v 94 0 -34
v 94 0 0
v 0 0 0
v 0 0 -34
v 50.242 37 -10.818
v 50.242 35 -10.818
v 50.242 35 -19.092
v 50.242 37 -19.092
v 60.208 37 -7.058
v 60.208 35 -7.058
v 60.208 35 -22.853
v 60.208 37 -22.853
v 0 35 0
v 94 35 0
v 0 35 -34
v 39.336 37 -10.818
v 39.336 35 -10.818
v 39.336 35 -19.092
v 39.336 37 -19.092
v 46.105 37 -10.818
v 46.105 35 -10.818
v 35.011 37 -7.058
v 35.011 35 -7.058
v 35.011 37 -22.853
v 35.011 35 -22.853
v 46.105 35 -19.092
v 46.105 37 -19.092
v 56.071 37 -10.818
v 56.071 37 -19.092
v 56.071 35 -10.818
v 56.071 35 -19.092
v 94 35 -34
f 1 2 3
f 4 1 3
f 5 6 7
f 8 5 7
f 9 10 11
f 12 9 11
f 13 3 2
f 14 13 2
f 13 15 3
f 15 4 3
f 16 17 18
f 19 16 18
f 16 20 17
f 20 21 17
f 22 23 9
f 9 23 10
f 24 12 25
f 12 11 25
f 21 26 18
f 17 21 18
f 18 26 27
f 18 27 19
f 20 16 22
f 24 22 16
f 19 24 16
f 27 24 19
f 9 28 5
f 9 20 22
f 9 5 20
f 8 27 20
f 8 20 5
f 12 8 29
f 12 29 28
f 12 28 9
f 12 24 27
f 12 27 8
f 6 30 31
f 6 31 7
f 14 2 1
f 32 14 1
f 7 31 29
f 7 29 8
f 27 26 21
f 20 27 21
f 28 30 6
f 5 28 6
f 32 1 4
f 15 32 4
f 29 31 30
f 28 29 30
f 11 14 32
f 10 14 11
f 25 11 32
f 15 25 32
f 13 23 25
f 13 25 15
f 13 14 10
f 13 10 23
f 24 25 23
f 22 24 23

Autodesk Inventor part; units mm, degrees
ref_plane "YZ Plane" through (0, 0, 0) normal (1, 0, 0) x (0, 1, 0)
ref_plane "XZ Plane" through (0, 0, 0) normal (0, 1, 0) x (-1, 0, 0)
ref_plane "XY Plane" through (0, 0, 0) normal (0, 0, 1) x (1, 0, 0)
sketch "Sketch1" plane through (0, 0, 0) normal (0, 1, 0) x (-1, 0, 0)
  line L0 (0, 0) -> (-94, 0)
  line L1 (-94, 0) -> (-94, -34)
  line L2 (-94, -34) -> (0, -34)
  line L3 (0, -34) -> (0, 0)
  dimension "d0" = 34
  dimension "d1" = 94
extrude "Extrusion1" add sketch "Sketch1" along normal blind 35
sketch "Sketch2" plane through (0, 35, 0) normal (0, 1, 0) x (1, 0, 0)
  line L0 (35.0106, 7.0576) -> (60.2075, 7.0576)
  line L1 (60.2075, 7.0576) -> (60.2075, 10.8183)
  line L2 (60.2075, 10.8183) -> (35.0106, 10.8183)
  line L3 (35.0106, 10.8183) -> (35.0106, 7.0576)
  line L4 (35.0106, 7.0576) -> (39.3355, 7.0576)
  line L5 (39.3355, 7.0576) -> (39.3355, 22.8526)
  line L6 (39.3355, 22.8526) -> (35.0106, 22.8526)
  line L7 (35.0106, 22.8526) -> (35.0106, 7.0576)
  line L8 (35.0106, 22.8526) -> (60.2075, 22.8526)
  line L9 (60.2075, 22.8526) -> (60.2075, 19.0919)
  line L10 (60.2075, 19.0919) -> (35.0106, 19.0919)
  line L11 (35.0106, 19.0919) -> (35.0106, 22.8526)
  line L12 (60.2075, 22.8526) -> (56.0707, 22.8526)
  line L13 (56.0707, 22.8526) -> (56.0707, 7.0576)
  line L14 (56.0707, 7.0576) -> (60.2075, 7.0576)
  line L15 (60.2075, 7.0576) -> (60.2075, 22.8526)
  line L16 (46.1048, 7.0576) -> (50.2416, 7.0576)
  line L17 (50.2416, 7.0576) -> (50.2416, 22.8526)
  line L18 (50.2416, 22.8526) -> (46.1048, 22.8526)
  line L19 (46.1048, 22.8526) -> (46.1048, 7.0576)
  point P0 (0, 0)
  point P1 (39.3355, 10.8183)
  point P2 (39.3355, 19.0919)
  point P3 (46.1048, 19.0919)
  point P4 (46.1048, 10.8183)
  point P5 (50.2416, 19.0919)
  point P6 (56.0707, 19.0919)
  point P7 (56.0707, 10.8183)
  point P8 (50.2416, 10.8183)
extrude "Extrusion2" add sketch "Sketch2" along normal blind 2 contours L3 L2 L5 L0 | L5 L2 L19 L0 | L7 L10 L5 L2 | L19 L2 L17 L0 | L7 L6 L5 L10 | L17 L2 L13 L0 | L19 L10 L17 L2 | L5 L8 L19 L10 | L13 L2 L1 L0 | L19 L8 L17 L10 | L13 L10 L15 L2 | L17 L8 L13 L10 | L13 L8 L9 L10
properties part number "Battery Lipo"
